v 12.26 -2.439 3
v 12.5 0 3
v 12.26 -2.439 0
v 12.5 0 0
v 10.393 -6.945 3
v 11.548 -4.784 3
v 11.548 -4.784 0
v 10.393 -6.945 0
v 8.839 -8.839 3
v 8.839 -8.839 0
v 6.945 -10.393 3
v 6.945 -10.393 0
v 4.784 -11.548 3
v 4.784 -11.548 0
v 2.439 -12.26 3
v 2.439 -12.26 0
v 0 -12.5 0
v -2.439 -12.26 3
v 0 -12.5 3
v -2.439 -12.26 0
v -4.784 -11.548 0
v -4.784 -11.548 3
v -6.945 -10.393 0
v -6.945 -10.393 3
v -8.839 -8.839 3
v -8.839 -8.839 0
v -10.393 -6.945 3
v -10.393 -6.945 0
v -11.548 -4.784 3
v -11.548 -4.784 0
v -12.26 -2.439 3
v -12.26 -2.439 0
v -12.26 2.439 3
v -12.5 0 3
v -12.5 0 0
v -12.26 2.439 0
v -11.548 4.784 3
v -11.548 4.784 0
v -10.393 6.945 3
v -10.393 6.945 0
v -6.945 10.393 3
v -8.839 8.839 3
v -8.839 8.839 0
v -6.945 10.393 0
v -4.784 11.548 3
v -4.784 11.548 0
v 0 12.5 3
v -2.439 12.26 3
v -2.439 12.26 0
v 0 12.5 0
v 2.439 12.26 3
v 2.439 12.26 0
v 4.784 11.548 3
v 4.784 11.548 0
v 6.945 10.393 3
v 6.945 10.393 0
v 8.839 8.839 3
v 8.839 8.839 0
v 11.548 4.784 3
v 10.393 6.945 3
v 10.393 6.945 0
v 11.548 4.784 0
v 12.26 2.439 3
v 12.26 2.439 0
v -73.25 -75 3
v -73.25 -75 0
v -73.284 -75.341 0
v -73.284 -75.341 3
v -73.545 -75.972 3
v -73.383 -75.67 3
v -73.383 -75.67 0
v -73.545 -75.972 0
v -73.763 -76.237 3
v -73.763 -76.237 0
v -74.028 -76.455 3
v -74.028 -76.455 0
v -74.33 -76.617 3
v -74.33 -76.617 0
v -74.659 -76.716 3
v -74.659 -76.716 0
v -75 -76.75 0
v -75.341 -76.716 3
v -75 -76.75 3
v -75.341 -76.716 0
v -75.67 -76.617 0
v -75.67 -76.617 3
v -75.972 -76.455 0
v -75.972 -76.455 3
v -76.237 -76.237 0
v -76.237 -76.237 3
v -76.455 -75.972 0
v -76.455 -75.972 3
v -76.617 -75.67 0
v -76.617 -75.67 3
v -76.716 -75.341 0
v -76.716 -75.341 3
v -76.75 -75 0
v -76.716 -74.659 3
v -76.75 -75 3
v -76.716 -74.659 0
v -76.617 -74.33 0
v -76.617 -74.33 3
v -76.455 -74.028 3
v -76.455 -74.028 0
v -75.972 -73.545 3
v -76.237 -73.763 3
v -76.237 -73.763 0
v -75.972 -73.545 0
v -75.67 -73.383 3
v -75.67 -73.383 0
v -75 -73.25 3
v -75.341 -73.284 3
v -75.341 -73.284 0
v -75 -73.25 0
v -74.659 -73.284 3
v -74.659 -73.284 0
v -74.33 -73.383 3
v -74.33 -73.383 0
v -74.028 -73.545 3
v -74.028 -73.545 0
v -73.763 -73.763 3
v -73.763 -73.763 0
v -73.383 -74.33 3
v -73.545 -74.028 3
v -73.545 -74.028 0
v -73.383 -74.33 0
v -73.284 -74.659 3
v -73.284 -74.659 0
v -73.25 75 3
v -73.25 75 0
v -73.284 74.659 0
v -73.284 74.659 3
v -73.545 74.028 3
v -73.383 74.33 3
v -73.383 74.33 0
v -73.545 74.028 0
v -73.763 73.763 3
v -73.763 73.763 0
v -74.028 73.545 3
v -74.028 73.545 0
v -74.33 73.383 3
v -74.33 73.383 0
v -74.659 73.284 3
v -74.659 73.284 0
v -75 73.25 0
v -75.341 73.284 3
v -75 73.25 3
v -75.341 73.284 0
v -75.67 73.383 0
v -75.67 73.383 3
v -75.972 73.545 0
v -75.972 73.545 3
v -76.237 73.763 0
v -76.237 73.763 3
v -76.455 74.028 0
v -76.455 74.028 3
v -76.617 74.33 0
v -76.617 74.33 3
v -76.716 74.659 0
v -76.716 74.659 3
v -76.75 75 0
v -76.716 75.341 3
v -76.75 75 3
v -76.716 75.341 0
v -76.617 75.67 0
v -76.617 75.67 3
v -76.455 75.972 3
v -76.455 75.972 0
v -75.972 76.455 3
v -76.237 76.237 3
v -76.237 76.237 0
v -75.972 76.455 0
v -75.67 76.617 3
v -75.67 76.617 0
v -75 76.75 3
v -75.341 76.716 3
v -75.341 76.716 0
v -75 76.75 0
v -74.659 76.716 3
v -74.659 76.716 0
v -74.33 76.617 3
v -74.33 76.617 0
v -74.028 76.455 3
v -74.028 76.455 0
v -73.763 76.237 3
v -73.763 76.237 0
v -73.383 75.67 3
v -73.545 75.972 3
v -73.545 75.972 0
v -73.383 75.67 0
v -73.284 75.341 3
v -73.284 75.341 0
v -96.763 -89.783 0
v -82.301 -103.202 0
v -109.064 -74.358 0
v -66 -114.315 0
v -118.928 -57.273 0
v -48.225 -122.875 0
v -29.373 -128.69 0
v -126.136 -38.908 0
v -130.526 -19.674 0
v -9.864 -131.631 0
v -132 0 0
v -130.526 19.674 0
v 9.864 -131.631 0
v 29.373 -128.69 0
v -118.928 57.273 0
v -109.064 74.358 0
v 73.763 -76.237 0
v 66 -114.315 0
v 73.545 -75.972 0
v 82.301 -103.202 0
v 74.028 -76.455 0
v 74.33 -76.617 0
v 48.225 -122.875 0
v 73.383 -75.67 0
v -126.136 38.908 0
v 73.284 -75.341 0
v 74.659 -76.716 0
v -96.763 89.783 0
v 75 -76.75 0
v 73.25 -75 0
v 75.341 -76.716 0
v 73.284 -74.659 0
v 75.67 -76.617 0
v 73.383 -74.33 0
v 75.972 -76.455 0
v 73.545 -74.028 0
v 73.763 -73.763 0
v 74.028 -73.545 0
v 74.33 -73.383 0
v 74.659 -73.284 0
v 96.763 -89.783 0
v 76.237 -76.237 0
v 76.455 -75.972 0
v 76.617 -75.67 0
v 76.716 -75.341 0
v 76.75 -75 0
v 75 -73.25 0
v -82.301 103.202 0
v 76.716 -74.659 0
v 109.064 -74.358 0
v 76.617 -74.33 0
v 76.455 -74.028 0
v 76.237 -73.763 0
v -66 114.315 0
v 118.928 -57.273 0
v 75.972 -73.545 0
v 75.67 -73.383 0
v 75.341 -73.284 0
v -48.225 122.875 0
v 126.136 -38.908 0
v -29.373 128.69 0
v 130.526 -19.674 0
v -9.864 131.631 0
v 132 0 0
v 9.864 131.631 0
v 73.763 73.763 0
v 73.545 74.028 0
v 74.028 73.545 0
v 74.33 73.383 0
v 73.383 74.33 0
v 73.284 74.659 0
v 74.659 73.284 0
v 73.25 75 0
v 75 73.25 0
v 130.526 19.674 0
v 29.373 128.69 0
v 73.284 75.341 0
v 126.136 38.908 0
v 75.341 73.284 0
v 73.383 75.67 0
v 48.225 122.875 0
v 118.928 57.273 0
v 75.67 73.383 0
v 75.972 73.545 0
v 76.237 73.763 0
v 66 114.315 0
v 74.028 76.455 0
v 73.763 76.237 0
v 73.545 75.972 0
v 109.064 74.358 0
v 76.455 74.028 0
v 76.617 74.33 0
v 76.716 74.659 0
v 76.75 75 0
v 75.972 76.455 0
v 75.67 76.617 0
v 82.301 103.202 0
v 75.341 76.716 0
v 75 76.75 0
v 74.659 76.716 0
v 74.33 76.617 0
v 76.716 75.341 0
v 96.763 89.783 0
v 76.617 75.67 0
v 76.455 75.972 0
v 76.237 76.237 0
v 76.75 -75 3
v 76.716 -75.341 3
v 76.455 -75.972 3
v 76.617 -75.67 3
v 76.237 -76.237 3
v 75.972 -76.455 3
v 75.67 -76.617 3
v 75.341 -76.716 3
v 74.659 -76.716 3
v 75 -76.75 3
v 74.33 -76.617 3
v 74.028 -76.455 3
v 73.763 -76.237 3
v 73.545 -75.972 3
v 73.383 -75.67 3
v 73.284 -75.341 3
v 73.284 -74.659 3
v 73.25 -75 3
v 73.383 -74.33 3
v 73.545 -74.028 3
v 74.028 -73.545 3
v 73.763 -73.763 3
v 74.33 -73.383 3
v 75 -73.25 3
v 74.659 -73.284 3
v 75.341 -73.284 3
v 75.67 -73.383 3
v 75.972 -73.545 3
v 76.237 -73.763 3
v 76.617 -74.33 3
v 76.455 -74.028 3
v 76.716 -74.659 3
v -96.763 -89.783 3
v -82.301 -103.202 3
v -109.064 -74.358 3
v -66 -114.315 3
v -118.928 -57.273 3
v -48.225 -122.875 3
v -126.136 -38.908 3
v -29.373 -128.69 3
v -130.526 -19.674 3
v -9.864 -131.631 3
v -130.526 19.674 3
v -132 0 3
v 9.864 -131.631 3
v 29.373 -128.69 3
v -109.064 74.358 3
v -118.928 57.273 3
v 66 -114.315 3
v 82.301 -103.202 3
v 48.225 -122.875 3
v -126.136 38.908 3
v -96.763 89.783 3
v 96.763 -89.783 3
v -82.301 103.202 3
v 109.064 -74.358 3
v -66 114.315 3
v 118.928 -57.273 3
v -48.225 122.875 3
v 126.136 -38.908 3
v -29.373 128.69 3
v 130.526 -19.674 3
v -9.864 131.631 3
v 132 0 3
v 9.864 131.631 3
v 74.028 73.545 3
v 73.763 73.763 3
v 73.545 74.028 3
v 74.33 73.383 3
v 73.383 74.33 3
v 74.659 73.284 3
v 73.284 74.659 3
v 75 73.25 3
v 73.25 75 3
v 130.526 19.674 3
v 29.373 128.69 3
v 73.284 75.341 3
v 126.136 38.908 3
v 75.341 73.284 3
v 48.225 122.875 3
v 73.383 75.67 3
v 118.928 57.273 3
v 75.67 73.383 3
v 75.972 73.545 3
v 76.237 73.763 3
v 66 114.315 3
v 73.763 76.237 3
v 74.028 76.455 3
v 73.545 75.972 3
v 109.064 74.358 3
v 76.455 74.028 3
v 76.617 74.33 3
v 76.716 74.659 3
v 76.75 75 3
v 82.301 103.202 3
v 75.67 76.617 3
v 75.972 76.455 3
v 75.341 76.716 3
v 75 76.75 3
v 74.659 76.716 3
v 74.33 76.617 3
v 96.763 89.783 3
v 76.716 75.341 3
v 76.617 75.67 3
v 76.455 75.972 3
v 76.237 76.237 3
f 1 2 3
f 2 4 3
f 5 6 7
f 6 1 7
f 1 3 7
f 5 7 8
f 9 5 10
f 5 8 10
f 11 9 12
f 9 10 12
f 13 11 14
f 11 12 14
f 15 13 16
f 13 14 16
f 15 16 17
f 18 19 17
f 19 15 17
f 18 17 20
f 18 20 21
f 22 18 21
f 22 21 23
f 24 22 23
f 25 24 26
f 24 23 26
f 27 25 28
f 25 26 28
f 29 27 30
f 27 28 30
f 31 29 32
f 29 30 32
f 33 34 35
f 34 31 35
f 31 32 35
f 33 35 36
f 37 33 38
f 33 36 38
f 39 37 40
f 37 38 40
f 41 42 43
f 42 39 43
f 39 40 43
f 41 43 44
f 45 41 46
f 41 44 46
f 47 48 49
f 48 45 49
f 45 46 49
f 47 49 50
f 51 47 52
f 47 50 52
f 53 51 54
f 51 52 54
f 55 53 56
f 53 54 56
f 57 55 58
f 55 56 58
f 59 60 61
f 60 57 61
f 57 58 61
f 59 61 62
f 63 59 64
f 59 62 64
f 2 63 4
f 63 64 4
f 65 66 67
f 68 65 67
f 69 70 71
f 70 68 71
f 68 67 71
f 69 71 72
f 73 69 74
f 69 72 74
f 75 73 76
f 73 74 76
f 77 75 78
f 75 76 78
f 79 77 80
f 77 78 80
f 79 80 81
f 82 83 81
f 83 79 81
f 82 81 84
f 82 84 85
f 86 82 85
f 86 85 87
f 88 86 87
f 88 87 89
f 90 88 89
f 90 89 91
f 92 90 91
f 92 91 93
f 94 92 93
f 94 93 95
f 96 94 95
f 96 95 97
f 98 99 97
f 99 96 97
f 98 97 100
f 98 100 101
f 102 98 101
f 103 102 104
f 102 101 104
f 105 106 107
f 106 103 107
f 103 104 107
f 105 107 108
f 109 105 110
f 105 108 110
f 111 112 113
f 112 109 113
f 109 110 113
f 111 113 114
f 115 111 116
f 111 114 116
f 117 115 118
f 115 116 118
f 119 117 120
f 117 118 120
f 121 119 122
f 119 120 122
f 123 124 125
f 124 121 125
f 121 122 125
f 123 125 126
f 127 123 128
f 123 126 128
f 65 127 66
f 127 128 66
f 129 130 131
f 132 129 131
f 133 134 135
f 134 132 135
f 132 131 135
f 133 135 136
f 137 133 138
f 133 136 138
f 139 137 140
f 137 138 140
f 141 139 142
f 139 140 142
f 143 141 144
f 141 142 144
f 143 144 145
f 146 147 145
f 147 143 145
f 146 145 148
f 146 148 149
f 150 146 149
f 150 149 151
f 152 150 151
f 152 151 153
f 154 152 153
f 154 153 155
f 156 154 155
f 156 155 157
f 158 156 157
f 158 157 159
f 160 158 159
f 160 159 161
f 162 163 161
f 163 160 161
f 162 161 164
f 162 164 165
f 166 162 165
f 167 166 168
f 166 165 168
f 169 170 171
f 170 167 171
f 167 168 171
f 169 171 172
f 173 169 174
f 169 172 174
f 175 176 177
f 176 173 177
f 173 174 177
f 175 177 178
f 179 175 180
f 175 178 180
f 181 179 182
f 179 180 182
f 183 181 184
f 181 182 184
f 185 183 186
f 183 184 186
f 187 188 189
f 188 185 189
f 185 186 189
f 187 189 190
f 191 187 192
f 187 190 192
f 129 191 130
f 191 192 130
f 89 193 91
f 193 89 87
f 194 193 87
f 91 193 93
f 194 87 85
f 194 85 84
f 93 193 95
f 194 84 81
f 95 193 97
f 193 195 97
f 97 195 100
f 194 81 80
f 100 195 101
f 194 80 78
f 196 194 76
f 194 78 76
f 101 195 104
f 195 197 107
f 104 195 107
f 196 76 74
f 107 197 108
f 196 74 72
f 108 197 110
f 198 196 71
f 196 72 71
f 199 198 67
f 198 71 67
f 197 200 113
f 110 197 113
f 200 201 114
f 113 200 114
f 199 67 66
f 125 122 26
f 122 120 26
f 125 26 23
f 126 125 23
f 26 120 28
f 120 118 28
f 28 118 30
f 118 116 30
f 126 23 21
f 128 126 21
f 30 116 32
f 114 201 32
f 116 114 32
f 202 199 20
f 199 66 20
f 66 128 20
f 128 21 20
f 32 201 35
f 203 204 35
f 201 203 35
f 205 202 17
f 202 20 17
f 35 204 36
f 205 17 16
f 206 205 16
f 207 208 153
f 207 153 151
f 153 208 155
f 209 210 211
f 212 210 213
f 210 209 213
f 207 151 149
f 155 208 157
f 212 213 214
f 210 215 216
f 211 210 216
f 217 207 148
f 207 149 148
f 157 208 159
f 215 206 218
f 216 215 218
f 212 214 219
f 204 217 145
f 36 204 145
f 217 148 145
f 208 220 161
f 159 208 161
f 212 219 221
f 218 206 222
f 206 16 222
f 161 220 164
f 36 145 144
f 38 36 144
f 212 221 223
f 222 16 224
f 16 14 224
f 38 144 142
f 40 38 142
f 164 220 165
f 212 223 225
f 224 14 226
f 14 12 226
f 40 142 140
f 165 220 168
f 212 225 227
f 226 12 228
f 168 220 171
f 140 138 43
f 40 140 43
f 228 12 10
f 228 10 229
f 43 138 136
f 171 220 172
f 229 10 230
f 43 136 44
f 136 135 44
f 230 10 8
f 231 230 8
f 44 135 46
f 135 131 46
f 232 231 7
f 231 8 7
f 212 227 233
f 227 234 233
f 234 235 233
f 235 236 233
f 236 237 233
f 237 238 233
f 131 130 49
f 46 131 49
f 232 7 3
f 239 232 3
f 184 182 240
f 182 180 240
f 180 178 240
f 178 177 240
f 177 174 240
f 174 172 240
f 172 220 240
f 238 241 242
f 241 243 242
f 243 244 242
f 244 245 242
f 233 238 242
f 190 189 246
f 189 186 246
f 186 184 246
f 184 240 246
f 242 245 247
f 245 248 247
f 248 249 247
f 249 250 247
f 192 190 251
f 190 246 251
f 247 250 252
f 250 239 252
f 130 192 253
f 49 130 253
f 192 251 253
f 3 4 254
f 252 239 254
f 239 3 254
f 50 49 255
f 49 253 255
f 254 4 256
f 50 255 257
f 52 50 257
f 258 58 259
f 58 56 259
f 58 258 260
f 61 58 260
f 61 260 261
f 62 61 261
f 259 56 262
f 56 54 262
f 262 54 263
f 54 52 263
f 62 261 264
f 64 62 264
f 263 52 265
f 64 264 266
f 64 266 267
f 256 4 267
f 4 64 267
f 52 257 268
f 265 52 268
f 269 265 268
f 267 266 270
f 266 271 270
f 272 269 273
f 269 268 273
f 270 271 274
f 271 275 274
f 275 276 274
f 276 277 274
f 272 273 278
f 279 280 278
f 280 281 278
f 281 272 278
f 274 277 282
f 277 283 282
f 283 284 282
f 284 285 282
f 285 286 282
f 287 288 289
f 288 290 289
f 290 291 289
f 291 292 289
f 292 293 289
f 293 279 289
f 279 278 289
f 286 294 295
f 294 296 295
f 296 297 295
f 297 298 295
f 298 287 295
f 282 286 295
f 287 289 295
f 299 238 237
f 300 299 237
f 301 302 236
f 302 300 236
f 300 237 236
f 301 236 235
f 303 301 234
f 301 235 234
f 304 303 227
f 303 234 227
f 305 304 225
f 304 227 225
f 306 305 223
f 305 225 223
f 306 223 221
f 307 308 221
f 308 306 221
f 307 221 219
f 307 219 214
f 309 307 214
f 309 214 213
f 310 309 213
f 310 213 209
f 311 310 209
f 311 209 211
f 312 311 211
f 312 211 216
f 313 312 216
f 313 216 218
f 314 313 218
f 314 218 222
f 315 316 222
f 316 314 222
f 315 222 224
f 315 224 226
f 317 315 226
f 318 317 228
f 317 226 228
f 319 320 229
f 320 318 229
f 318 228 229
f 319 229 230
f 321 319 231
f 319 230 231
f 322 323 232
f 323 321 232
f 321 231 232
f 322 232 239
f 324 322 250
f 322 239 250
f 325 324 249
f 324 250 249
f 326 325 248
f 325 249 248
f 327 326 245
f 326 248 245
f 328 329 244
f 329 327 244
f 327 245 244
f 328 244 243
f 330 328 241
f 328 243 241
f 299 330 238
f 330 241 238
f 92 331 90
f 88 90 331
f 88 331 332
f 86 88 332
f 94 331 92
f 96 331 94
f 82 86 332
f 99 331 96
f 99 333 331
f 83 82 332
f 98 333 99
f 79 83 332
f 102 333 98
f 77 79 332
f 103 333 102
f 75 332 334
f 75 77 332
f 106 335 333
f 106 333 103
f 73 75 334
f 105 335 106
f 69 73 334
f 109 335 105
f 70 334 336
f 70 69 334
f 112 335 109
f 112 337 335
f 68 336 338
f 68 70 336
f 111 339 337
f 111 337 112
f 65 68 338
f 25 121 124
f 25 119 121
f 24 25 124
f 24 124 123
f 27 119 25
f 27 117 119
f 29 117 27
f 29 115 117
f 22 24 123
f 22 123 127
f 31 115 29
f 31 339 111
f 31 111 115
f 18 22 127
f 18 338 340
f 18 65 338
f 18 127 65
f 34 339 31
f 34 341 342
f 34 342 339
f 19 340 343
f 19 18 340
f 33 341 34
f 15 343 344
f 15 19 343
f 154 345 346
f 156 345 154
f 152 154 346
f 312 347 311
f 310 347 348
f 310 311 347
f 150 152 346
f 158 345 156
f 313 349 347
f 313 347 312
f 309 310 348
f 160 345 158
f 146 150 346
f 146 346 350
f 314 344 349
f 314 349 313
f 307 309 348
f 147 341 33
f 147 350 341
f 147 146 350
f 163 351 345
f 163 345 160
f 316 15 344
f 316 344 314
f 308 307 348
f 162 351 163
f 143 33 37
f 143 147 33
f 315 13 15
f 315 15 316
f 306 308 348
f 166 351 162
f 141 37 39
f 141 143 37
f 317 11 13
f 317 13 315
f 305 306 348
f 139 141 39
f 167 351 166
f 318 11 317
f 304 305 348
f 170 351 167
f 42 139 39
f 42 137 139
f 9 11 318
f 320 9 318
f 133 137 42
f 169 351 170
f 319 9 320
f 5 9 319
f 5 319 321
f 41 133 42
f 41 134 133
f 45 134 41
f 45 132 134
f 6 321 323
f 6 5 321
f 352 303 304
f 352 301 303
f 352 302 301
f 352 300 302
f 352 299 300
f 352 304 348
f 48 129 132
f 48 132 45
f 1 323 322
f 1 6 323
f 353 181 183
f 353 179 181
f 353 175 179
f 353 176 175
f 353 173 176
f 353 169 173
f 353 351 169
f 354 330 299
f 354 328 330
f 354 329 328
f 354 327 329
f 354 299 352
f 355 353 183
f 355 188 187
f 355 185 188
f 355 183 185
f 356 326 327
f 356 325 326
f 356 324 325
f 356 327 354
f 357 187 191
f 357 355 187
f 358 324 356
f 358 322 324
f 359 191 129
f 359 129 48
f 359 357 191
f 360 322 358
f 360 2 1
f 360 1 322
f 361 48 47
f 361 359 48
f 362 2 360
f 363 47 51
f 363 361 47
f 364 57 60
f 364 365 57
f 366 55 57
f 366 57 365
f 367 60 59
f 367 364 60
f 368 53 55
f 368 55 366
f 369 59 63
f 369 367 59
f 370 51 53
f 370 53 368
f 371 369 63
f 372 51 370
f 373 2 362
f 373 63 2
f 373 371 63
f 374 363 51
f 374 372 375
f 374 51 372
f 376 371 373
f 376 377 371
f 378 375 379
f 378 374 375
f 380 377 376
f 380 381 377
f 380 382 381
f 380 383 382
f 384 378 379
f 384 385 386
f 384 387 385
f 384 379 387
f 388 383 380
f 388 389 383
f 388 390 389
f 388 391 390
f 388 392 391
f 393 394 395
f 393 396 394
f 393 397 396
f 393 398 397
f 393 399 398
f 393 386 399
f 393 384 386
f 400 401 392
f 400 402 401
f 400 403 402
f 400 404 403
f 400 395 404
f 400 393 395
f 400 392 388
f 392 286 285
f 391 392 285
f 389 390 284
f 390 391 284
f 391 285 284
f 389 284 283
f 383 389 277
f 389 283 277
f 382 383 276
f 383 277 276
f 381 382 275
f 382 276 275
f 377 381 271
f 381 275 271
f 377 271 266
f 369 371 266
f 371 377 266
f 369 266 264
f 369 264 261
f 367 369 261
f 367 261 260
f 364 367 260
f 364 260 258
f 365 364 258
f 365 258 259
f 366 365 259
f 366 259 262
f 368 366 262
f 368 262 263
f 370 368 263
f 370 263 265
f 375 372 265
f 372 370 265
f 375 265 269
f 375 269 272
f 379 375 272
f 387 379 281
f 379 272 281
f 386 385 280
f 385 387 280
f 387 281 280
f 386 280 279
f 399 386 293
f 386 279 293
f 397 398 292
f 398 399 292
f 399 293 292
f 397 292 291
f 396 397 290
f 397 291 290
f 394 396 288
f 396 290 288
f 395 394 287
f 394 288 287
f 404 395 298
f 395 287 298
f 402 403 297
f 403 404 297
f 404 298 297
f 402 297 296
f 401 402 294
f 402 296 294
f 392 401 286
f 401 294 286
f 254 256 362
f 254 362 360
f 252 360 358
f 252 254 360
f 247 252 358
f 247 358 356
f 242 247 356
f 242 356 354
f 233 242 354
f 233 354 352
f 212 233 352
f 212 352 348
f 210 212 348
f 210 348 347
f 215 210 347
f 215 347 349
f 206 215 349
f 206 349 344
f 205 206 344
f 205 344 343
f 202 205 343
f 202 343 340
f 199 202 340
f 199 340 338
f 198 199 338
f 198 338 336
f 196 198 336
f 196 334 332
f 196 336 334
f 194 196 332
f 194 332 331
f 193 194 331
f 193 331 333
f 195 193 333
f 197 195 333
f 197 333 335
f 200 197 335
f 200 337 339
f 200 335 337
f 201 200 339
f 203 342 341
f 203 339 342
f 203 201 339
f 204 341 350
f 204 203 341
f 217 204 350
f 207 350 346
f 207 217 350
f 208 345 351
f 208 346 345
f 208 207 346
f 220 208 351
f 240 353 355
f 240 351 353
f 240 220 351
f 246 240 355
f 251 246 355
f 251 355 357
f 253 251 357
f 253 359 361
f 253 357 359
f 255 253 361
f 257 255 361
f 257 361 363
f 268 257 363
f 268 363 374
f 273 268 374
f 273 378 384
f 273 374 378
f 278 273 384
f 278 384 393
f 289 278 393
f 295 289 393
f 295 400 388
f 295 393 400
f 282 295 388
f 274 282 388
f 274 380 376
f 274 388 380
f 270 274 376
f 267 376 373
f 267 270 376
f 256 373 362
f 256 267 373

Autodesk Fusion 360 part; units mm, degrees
sketch "Sketch1" plane through (0, 0, 0) normal (0, 0, 1) x (1, 0, 0)
  circle A0 centre (-75, 75) radius 1.75
  circle A1 centre (-75, -75) radius 1.75
  circle A2 centre (75, -75) radius 1.75
  circle A3 centre (75, 75) radius 1.75
  circle A4 centre (0, 0) radius 132
  circle A5 centre (0, 0) radius 12.5
  dimension "d1" = 264
  dimension "d4" = 3.5
  dimension "d6" = 360
  dimension "d46" = 75
  dimension "d47" = 75
  dimension "d48" = 25
extrude "Extrude1" add sketch "Sketch1" along normal blind 3
